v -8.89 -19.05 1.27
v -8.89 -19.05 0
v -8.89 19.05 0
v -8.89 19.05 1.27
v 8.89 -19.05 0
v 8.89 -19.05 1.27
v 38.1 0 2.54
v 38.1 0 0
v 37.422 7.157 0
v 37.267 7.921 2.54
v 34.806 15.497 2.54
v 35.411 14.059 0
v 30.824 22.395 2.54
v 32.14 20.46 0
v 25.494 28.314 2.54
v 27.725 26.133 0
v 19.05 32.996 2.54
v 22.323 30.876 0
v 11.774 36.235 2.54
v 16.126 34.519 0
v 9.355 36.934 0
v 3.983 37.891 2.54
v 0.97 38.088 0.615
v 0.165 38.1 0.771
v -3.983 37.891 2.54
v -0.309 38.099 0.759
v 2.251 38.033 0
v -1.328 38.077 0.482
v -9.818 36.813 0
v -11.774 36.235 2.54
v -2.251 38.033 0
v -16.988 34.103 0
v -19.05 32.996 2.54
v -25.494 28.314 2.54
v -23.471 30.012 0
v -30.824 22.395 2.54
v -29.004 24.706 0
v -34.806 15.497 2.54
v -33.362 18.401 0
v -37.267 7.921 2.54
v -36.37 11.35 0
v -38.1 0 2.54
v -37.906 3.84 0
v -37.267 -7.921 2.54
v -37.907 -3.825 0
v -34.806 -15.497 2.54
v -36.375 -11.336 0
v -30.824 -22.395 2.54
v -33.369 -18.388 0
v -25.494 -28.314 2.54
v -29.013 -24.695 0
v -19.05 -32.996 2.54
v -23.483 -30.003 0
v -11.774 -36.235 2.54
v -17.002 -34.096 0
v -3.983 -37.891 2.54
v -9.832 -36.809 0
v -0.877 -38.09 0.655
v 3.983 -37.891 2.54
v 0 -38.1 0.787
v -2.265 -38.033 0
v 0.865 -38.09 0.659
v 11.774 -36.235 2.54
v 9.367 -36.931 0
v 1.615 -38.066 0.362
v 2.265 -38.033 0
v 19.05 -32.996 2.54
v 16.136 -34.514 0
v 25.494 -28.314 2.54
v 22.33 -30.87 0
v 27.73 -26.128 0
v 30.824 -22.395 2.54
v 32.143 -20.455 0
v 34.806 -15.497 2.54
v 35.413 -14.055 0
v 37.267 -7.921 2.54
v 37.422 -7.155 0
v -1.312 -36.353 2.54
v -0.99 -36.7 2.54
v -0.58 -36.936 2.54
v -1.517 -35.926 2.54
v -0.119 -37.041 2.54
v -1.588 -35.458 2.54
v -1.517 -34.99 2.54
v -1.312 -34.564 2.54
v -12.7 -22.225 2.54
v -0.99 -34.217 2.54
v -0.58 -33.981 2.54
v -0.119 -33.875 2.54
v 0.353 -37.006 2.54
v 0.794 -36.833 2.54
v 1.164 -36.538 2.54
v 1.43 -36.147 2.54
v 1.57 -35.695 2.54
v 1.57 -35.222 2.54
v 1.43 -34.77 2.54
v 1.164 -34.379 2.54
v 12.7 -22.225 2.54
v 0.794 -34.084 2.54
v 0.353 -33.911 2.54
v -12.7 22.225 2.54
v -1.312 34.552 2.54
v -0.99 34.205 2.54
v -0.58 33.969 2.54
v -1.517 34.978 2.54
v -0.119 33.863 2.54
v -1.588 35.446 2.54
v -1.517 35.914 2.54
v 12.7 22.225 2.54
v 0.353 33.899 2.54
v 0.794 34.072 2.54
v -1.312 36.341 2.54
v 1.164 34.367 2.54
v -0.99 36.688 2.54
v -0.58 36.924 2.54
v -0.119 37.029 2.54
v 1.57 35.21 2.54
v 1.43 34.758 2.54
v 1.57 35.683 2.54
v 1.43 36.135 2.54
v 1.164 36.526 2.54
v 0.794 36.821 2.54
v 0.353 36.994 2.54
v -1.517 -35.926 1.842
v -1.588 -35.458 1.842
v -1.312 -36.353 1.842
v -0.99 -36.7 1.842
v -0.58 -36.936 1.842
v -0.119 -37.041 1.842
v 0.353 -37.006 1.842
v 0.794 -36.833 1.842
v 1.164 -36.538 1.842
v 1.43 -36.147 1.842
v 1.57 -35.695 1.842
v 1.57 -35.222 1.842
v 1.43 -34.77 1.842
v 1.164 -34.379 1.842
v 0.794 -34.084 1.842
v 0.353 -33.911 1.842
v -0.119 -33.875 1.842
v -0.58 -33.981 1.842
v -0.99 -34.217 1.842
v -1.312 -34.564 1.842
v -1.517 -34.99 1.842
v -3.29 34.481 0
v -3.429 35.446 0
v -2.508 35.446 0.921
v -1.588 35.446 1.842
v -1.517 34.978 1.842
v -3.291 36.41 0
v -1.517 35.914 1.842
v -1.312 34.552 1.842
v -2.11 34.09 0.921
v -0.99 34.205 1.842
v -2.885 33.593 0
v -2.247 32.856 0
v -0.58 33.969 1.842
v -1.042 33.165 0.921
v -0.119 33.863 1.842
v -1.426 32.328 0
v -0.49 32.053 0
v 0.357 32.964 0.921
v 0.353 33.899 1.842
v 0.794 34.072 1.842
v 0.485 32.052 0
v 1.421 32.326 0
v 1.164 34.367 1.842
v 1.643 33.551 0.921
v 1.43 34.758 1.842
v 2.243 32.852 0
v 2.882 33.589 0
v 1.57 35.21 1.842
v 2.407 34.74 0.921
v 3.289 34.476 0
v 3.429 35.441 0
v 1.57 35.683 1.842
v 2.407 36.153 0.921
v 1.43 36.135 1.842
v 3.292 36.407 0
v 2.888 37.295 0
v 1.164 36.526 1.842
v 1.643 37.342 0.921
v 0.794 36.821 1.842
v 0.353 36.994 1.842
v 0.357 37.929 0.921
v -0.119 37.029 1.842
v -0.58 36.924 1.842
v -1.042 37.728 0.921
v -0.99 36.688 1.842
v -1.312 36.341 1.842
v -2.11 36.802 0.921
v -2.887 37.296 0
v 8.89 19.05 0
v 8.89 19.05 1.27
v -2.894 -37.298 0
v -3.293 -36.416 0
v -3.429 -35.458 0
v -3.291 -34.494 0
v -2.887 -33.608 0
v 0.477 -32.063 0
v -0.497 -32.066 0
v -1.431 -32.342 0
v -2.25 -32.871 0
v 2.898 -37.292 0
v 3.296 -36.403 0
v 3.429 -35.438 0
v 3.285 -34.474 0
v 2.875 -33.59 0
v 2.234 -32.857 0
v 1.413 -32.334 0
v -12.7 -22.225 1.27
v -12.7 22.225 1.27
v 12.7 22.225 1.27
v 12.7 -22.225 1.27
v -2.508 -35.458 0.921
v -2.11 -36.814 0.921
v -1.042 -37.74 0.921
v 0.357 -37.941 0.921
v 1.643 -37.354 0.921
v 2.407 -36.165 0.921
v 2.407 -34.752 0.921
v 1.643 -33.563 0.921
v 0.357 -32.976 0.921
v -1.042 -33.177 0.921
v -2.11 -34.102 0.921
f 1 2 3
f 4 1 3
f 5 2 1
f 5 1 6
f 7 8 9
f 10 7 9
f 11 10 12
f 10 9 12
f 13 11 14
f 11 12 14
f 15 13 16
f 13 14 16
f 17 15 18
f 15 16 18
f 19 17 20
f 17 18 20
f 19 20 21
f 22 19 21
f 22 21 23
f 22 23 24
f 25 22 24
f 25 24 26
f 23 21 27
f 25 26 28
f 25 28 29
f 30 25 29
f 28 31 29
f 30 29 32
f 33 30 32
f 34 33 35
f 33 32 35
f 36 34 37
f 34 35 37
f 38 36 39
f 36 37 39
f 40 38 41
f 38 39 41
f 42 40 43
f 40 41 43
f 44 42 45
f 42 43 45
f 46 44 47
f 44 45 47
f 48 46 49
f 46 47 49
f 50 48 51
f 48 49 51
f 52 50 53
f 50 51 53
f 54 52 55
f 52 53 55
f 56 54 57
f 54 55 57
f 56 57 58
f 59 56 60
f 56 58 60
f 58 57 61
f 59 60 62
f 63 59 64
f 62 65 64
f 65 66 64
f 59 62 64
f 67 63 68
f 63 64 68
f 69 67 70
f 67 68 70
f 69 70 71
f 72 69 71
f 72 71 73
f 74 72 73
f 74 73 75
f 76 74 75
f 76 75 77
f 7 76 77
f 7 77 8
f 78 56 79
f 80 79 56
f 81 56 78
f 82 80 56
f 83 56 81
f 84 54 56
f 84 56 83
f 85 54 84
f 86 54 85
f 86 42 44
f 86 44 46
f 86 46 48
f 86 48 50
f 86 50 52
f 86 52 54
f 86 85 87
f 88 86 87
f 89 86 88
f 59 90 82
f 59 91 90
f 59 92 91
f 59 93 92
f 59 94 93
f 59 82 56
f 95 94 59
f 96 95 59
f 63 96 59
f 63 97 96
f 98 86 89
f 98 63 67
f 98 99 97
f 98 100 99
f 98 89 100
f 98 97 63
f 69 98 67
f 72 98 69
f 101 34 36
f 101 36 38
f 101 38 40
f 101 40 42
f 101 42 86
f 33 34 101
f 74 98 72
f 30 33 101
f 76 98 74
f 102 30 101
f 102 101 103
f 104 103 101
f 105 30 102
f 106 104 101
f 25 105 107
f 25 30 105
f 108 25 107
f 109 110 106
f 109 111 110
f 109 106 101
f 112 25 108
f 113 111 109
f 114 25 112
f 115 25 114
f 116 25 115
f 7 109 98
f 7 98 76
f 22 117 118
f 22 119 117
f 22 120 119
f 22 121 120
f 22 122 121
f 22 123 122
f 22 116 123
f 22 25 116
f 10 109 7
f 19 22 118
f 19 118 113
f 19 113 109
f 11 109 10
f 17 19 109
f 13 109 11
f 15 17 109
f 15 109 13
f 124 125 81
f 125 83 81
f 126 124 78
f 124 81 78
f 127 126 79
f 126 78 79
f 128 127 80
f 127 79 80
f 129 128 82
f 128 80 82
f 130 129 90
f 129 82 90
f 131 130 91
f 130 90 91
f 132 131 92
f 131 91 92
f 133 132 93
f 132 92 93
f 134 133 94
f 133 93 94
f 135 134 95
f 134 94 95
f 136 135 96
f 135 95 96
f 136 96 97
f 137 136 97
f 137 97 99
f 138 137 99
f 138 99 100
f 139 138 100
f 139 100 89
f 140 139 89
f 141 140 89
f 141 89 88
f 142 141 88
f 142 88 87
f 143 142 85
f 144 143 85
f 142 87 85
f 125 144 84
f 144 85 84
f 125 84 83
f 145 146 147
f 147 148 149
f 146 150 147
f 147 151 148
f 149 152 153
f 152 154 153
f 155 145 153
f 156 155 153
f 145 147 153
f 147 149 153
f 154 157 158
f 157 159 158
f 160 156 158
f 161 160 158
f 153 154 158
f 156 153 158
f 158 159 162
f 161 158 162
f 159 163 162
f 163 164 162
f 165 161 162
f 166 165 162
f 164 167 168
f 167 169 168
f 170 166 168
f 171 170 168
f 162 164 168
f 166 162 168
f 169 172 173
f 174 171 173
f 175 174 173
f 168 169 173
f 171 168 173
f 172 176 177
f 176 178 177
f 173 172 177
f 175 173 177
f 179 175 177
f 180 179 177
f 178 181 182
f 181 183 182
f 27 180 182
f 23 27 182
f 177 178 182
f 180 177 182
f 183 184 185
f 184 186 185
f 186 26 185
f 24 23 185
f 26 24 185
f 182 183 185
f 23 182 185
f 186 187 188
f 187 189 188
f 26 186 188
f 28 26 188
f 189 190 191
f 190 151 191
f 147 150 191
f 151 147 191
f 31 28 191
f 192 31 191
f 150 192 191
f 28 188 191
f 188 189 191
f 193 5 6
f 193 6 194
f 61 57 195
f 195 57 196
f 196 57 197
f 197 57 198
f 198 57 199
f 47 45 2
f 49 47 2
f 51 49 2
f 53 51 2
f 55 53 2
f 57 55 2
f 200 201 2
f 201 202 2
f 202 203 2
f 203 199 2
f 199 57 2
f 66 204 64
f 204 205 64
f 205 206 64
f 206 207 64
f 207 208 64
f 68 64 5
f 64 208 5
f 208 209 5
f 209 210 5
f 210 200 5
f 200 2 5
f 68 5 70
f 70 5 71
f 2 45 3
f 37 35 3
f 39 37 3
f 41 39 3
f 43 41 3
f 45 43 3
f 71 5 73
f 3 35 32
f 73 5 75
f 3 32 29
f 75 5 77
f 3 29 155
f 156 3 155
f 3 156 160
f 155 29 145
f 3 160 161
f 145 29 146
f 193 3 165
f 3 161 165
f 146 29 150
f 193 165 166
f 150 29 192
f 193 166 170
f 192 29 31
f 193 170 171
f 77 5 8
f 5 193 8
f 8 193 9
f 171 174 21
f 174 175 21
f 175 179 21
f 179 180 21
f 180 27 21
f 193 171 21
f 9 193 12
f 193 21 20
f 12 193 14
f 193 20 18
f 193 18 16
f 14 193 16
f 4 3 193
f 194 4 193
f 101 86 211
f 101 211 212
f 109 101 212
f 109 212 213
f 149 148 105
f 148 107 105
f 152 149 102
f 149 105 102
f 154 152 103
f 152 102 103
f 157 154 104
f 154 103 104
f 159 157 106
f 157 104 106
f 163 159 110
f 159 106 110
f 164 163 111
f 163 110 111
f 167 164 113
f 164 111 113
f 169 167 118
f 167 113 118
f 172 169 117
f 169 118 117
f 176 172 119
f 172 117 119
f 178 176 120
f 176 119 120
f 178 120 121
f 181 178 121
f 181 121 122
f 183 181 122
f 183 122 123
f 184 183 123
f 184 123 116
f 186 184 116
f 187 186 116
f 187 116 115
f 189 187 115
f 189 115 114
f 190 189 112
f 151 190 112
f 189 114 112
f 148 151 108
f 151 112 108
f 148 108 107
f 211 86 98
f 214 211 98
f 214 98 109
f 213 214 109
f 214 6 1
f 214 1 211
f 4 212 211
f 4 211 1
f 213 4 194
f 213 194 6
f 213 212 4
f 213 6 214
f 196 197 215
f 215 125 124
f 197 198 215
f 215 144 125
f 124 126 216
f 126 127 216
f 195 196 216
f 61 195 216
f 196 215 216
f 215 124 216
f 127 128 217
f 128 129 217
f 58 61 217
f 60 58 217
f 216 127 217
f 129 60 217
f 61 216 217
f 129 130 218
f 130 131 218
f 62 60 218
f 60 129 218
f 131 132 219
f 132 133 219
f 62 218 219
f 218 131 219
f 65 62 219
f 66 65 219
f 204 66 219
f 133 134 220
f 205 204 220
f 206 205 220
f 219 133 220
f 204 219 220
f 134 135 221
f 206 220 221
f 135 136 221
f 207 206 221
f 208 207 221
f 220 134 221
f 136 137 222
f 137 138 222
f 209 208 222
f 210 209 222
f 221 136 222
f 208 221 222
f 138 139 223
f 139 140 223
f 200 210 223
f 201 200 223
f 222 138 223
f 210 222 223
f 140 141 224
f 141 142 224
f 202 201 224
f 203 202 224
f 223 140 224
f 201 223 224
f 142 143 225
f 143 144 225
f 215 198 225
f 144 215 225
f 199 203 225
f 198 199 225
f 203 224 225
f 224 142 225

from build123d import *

# Parameters (mm, degrees)
F0_R           = 38.1
F0_W           = 17.78
F0_H           = 38.1
F2_DEPTH       = 2.54
F3_D           = 3.175
F3_CSINK_D     = 6.858
F3_CSINK_ANGLE = 90
F4_W           = 25.4
F4_H           = 44.45
F4_W_2         = 17.78
F4_H_2         = 38.1
F5_DEPTH       = 1.27


with BuildPart() as f2:
    # F0 (on Top) → F2 (new body)
    with BuildSketch(Plane.XY):
        Circle(F0_R)
        Rectangle(F0_W, F0_H, mode=Mode.SUBTRACT)
    extrude(amount=F2_DEPTH)

    # F3 (through all)
    with Locations(Plane(origin=(0, 0, 0), x_dir=(1, 0, 0), z_dir=(0, 0, -1))):
        with Locations((0, 35.4584), (0, -35.4463979602)):
            CounterSinkHole(F3_D / 2, F3_CSINK_D / 2, counter_sink_angle=F3_CSINK_ANGLE)

    # F4 (on face) → F5 (cut)
    with BuildSketch(Plane.XY.offset(2.54)):
        Rectangle(F4_W, F4_H)
        Rectangle(F4_W_2, F4_H_2, mode=Mode.SUBTRACT)
    extrude(amount=-F5_DEPTH, mode=Mode.SUBTRACT)


solid = f2.part
